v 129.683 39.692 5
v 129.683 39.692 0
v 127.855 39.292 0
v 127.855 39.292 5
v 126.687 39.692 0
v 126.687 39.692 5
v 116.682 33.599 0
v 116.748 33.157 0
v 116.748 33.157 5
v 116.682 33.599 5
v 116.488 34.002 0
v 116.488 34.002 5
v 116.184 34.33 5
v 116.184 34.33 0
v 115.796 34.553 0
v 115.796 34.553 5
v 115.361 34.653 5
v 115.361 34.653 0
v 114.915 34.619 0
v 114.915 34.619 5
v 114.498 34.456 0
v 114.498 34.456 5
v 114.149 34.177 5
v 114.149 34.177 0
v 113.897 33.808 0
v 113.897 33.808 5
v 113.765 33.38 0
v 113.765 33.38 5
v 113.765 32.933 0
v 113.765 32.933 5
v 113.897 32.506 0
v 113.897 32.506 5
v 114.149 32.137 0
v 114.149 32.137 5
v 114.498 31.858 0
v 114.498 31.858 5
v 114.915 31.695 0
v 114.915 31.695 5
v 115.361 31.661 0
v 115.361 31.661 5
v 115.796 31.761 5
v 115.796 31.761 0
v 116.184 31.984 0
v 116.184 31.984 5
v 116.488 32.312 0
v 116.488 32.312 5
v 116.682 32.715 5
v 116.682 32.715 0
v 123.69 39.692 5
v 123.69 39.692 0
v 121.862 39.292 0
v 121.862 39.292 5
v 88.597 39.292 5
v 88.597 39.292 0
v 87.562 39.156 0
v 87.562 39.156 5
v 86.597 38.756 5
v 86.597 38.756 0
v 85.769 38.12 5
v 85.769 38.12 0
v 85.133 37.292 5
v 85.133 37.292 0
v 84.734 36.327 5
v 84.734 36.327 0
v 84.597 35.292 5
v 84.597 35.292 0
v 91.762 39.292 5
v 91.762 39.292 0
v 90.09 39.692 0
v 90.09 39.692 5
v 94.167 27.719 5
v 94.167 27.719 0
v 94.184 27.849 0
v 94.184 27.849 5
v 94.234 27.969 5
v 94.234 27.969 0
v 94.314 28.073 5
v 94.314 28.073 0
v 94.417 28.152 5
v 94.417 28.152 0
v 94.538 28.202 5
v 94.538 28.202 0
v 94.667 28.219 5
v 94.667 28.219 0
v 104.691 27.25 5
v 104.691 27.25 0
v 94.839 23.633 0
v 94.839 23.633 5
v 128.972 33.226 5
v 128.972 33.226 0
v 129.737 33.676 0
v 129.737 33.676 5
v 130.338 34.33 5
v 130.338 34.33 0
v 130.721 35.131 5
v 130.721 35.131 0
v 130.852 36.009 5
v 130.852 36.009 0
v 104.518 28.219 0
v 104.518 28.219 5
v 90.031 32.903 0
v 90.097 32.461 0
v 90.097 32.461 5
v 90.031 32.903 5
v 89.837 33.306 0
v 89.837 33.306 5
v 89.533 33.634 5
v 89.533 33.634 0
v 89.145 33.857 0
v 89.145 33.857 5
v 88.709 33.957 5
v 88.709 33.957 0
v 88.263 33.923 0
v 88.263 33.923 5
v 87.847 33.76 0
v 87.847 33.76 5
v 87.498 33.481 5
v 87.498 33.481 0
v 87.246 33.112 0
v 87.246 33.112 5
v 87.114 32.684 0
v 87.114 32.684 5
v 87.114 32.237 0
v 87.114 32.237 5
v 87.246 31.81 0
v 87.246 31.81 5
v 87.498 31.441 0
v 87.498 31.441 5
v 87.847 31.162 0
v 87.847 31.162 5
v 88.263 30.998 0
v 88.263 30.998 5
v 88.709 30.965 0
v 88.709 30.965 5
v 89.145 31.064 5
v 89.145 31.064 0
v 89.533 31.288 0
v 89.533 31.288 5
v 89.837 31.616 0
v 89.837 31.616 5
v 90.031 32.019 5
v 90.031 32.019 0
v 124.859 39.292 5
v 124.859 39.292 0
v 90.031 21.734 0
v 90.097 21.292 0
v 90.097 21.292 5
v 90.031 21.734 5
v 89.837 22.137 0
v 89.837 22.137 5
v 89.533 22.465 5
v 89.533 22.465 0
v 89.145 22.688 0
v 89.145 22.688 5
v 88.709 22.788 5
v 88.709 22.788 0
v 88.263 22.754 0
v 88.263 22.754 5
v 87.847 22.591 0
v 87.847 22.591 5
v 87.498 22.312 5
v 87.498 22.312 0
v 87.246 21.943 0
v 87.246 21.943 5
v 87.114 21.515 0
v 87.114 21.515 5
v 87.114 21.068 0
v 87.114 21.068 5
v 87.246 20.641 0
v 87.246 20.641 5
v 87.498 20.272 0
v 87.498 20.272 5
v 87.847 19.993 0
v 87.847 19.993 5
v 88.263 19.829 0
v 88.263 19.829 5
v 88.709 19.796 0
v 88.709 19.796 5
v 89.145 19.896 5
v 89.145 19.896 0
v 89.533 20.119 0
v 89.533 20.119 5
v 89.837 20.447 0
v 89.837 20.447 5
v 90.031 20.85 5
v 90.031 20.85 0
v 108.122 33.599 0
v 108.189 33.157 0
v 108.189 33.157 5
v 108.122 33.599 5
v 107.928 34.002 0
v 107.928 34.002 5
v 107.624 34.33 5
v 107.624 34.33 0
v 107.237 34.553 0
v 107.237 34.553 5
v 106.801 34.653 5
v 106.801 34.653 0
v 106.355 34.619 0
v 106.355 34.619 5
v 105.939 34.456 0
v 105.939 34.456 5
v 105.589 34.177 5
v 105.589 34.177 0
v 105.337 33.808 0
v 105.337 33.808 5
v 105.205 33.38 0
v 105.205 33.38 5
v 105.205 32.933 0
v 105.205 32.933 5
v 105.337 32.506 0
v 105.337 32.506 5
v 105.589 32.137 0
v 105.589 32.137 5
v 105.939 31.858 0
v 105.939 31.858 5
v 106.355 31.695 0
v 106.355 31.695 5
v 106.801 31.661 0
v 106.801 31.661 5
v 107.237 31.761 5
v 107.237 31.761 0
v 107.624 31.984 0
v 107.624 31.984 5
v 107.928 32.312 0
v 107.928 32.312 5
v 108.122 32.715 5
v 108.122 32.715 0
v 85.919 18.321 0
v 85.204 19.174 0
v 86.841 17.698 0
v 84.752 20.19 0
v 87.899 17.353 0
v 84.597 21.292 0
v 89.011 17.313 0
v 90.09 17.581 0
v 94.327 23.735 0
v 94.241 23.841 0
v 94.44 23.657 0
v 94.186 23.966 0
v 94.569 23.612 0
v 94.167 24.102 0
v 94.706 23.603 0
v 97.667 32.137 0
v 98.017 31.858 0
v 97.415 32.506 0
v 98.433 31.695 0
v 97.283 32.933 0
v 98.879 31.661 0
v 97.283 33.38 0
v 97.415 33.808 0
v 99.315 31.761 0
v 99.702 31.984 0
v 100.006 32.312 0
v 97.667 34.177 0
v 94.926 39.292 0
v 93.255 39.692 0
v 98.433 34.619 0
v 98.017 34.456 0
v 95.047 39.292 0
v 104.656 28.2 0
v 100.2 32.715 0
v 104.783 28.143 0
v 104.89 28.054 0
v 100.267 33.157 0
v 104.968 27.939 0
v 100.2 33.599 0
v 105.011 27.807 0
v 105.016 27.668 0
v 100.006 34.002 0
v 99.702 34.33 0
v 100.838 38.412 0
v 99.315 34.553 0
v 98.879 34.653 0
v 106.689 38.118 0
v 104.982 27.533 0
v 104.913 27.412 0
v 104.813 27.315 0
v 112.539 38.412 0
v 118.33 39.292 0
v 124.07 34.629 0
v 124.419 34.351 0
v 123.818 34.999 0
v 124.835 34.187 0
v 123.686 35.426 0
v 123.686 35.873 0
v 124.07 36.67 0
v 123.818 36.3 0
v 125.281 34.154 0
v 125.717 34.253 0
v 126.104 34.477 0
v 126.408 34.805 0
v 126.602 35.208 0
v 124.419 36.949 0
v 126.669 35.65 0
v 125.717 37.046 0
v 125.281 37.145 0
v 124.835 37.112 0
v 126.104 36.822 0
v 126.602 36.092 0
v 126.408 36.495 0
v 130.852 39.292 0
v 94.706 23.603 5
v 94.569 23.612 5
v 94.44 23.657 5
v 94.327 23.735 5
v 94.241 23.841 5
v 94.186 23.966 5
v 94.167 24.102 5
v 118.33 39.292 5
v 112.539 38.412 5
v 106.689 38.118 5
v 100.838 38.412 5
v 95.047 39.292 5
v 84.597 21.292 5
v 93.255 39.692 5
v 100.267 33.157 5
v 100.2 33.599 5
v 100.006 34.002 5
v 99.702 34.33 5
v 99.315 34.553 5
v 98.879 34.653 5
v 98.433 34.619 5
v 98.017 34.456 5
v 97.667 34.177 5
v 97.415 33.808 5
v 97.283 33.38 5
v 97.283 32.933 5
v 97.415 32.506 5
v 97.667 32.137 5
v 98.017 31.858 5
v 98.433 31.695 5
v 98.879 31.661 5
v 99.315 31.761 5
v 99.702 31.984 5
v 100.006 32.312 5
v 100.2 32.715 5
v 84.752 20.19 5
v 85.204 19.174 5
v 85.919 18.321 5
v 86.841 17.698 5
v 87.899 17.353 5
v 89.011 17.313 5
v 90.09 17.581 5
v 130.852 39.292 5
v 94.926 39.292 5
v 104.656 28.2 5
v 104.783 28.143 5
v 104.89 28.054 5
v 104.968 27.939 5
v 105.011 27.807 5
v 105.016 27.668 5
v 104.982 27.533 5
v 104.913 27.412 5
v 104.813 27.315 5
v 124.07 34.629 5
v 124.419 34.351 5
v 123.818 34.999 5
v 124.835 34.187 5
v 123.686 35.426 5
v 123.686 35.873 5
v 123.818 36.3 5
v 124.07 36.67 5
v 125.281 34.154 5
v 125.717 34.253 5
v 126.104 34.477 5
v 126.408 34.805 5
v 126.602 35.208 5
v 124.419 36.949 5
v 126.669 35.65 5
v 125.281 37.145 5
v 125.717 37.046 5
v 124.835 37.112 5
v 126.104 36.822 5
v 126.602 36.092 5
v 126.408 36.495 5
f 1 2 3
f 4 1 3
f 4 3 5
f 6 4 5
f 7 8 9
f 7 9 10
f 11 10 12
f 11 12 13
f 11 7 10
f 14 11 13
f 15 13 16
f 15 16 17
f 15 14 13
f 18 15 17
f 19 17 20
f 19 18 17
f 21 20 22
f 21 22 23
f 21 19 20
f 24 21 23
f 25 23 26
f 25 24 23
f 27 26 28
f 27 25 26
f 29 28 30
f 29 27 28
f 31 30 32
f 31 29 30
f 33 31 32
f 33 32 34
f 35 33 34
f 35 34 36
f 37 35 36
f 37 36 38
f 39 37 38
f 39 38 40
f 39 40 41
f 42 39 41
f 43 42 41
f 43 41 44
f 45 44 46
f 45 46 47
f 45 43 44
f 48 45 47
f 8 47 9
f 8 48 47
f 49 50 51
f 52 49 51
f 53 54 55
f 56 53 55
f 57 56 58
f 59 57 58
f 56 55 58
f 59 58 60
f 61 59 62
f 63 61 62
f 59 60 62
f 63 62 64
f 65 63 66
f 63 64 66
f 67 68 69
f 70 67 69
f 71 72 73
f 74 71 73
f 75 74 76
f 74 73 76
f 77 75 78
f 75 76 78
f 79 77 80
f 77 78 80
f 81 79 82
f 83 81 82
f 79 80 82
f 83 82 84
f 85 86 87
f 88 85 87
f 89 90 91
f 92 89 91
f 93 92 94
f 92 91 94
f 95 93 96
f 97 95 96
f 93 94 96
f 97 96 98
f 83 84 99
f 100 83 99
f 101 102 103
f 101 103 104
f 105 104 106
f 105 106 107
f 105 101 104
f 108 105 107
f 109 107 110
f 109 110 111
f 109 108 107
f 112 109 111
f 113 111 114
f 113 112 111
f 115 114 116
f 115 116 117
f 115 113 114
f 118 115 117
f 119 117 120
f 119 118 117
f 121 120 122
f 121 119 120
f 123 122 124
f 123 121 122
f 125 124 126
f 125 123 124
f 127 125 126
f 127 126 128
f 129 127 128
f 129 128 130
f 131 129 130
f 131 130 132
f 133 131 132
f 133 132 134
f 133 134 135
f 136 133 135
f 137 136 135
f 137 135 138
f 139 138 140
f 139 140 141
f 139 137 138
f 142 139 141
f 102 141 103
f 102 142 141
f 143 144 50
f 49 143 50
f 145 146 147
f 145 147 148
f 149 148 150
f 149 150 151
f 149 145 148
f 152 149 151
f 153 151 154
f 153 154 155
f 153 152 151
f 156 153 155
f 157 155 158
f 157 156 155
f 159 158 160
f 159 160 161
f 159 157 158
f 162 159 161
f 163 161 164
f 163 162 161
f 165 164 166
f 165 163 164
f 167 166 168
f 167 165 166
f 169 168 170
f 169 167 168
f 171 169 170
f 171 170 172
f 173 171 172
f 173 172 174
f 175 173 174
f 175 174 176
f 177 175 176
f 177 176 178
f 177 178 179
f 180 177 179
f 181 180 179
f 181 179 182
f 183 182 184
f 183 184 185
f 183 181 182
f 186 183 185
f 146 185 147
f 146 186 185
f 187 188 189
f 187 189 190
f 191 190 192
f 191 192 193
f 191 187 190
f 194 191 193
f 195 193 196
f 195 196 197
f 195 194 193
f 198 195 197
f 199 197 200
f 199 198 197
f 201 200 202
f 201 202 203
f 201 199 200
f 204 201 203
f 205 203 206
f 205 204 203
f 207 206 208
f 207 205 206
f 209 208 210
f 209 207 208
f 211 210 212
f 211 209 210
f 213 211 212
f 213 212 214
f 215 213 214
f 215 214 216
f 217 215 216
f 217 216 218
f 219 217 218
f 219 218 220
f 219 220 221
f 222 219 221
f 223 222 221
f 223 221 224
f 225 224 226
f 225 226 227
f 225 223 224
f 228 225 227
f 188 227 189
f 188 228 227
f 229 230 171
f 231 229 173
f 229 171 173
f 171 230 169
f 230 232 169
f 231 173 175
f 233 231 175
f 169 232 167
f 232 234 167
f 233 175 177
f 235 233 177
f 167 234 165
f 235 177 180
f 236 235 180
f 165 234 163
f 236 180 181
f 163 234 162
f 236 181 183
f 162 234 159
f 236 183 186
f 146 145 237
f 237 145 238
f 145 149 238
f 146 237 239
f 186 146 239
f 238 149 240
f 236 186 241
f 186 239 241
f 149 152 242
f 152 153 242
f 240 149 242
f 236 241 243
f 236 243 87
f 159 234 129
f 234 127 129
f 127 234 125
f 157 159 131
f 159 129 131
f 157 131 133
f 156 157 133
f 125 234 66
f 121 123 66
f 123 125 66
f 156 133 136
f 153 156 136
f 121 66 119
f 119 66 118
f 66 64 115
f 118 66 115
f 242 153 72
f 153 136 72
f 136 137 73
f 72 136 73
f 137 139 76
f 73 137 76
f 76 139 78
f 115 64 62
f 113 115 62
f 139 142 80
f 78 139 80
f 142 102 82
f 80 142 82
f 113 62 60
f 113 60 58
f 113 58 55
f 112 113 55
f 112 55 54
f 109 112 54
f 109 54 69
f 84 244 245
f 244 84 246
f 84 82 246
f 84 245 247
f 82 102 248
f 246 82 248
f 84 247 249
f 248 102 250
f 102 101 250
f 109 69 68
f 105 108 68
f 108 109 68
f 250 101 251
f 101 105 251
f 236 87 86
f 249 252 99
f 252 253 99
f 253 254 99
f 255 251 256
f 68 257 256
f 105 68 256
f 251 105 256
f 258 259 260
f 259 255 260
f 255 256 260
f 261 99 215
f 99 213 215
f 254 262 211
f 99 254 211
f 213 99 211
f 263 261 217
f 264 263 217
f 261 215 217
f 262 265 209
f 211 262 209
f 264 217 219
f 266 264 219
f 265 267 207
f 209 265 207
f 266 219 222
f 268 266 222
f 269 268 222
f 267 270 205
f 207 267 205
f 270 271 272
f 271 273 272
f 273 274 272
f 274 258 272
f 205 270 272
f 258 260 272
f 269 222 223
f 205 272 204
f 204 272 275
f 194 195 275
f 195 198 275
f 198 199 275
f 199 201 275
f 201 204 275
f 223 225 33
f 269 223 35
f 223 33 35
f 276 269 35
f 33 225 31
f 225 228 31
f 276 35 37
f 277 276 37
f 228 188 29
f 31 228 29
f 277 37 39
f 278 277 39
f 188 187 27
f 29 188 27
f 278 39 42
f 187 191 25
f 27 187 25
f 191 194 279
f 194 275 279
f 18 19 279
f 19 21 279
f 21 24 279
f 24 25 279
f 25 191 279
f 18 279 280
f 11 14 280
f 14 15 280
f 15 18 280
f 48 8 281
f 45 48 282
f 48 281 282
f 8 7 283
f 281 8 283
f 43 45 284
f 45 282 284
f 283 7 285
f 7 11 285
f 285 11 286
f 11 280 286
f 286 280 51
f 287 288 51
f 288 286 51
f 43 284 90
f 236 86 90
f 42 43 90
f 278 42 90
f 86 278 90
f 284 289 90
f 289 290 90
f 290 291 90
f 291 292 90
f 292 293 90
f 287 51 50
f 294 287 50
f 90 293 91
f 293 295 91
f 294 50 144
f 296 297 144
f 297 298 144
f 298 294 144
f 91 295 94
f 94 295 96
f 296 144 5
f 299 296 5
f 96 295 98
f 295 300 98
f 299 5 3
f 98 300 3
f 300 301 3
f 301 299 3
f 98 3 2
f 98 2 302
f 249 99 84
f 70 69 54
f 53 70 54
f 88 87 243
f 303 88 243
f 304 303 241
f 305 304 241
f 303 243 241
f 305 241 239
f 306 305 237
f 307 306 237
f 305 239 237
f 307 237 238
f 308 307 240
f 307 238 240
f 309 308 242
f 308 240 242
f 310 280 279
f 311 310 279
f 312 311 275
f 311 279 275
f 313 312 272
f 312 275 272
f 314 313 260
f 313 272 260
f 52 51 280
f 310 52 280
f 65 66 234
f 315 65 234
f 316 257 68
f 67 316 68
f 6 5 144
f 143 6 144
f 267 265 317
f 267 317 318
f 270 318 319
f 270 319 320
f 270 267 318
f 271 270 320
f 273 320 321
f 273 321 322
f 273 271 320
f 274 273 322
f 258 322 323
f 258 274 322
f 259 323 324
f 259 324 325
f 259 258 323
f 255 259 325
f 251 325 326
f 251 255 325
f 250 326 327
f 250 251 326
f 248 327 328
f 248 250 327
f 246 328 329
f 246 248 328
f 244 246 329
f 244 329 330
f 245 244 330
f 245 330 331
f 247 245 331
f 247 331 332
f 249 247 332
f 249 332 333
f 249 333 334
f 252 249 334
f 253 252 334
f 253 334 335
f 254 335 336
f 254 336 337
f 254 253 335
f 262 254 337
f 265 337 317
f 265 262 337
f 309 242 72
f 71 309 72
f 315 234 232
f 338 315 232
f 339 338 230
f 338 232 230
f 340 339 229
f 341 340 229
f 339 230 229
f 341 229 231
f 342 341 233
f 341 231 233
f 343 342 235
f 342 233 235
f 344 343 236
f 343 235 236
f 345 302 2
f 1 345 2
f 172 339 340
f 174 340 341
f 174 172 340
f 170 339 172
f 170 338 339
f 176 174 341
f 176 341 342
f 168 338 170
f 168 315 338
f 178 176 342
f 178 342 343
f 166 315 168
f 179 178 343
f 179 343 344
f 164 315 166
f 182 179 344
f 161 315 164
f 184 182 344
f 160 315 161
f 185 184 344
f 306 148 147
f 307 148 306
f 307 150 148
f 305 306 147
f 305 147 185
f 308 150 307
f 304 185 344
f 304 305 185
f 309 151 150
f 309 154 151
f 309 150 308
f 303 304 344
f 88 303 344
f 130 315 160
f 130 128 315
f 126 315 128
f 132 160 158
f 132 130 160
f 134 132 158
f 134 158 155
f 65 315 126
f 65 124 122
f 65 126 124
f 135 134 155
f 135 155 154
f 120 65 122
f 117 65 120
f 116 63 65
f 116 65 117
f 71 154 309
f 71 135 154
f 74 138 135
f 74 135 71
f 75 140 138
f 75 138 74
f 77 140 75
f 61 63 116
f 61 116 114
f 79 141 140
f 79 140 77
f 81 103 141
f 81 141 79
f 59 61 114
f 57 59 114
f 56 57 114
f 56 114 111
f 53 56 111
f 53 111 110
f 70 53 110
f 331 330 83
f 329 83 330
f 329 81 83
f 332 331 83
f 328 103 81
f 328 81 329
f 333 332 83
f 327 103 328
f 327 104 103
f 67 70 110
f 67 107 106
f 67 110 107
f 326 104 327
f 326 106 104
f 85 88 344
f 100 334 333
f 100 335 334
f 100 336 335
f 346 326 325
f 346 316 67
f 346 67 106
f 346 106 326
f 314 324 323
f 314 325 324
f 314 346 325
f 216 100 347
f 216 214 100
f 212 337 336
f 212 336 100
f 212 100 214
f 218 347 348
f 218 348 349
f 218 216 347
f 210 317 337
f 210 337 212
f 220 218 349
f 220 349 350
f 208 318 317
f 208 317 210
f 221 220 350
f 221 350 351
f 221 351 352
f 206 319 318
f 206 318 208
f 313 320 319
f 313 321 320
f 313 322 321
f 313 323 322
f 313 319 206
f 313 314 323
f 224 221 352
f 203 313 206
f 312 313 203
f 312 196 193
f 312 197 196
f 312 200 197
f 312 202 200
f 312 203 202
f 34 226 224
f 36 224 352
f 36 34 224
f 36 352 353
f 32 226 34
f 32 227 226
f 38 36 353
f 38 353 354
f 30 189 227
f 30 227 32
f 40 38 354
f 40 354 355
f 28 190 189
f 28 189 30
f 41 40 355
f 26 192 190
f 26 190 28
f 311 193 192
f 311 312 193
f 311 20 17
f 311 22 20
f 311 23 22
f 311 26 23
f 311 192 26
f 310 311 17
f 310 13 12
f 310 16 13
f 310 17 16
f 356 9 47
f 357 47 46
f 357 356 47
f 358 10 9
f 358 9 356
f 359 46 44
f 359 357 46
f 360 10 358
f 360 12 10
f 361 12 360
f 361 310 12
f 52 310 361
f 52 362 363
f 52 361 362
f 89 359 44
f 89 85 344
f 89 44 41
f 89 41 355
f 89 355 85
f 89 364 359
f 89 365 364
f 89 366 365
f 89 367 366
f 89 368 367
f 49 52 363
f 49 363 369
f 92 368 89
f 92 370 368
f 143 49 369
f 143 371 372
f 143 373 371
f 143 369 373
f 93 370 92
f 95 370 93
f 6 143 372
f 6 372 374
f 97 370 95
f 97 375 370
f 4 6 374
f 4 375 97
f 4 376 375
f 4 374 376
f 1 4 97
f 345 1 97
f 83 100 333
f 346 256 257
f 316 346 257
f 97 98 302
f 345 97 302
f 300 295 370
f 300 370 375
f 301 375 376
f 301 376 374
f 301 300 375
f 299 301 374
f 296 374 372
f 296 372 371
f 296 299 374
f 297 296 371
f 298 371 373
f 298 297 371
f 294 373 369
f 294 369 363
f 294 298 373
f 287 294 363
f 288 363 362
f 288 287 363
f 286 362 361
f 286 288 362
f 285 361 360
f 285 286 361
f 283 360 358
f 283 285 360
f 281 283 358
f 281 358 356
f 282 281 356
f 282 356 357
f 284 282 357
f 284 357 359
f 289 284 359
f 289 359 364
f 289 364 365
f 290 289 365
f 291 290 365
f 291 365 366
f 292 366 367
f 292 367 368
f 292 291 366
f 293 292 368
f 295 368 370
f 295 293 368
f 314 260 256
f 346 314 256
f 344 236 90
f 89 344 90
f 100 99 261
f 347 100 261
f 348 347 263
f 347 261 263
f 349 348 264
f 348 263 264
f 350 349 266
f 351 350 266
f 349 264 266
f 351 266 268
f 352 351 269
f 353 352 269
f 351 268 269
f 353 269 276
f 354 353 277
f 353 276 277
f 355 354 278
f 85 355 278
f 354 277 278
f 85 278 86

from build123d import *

# Parameters (mm, degrees)
SKETCH1_R           = 1.5
BOSS_EXTRUDE1_DEPTH = 5


with BuildPart() as part:
    # Sketch1 → Boss-Extrude1 (new body)
    with BuildSketch(Plane.XY):
        with BuildLine():
            Line((90.09046413, 17.581004237), (128.971852367, 33.226333782))
            ThreePointArc((128.971852367, 33.226333782), (130.33788662, 34.330135362), (130.851957871, 36.009468044))
            Line((130.851957871, 36.009468044), (130.851957871, 39.291849919))
            Line((130.851957871, 39.291849919), (129.683368149, 39.691849919))
            Line((129.683368149, 39.691849919), (127.855440432, 39.291849919))
            Line((127.855440432, 39.291849919), (126.68685071, 39.691849919))
            Line((126.68685071, 39.691849919), (124.858922992, 39.291849919))
            Line((124.858922992, 39.291849919), (123.69033327, 39.691849919))
            Line((123.69033327, 39.691849919), (121.862405553, 39.291849919))
            Line((121.862405553, 39.291849919), (118.330499072, 39.291849919))
            ThreePointArc((118.330499072, 39.291849919), (106.6886691, 38.118374493), (95.046839129, 39.291849919))
            Line((95.046839129, 39.291849919), (94.926233776, 39.291849919))
            Line((94.926233776, 39.291849919), (93.254945284, 39.691849919))
            Line((93.254945284, 39.691849919), (91.761752622, 39.291849919))
            Line((91.761752622, 39.291849919), (90.09046413, 39.691849919))
            Line((90.09046413, 39.691849919), (88.597271468, 39.291849919))
            ThreePointArc((88.597271468, 39.291849919), (85.768844343, 38.120277044), (84.597271468, 35.291849919))
            Line((84.597271468, 35.291849919), (84.597271468, 21.291849919))
            ThreePointArc((84.597271468, 21.291849919), (86.358161226, 17.977278254), (90.09046413, 17.581004237))
        make_face()
        with Locations((88.597271468, 32.460805113)):
            Circle(SKETCH1_R, mode=Mode.SUBTRACT)
        with BuildLine():
            Line((94.167132873, 24.101877808), (94.167132873, 27.719143002))
            ThreePointArc((94.167132873, 27.719143002), (94.313579482, 28.072696393), (94.667132873, 28.219143002))
            Line((94.667132873, 28.219143002), (104.518408295, 28.219143002))
            ThreePointArc((104.518408295, 28.219143002), (105.010688474, 27.806665718), (104.690751088, 27.249783905))
            Line((104.690751088, 27.249783905), (94.839475666, 23.632518711))
            ThreePointArc((94.839475666, 23.632518711), (94.380926126, 23.691895249), (94.167132873, 24.101877808))
        make_face(mode=Mode.SUBTRACT)
        with Locations((115.248465962, 33.15691525)):
            Circle(SKETCH1_R, mode=Mode.SUBTRACT)
        with Locations((125.169093906, 35.649647236)):
            Circle(SKETCH1_R, mode=Mode.SUBTRACT)
        with Locations((98.766505389, 33.15691525)):
            Circle(SKETCH1_R, mode=Mode.SUBTRACT)
        with Locations((106.6886691, 33.15691525)):
            Circle(SKETCH1_R, mode=Mode.SUBTRACT)
        with Locations((88.597271468, 21.291849919)):
            Circle(SKETCH1_R, mode=Mode.SUBTRACT)
    extrude(amount=BOSS_EXTRUDE1_DEPTH)


solid = part.part
